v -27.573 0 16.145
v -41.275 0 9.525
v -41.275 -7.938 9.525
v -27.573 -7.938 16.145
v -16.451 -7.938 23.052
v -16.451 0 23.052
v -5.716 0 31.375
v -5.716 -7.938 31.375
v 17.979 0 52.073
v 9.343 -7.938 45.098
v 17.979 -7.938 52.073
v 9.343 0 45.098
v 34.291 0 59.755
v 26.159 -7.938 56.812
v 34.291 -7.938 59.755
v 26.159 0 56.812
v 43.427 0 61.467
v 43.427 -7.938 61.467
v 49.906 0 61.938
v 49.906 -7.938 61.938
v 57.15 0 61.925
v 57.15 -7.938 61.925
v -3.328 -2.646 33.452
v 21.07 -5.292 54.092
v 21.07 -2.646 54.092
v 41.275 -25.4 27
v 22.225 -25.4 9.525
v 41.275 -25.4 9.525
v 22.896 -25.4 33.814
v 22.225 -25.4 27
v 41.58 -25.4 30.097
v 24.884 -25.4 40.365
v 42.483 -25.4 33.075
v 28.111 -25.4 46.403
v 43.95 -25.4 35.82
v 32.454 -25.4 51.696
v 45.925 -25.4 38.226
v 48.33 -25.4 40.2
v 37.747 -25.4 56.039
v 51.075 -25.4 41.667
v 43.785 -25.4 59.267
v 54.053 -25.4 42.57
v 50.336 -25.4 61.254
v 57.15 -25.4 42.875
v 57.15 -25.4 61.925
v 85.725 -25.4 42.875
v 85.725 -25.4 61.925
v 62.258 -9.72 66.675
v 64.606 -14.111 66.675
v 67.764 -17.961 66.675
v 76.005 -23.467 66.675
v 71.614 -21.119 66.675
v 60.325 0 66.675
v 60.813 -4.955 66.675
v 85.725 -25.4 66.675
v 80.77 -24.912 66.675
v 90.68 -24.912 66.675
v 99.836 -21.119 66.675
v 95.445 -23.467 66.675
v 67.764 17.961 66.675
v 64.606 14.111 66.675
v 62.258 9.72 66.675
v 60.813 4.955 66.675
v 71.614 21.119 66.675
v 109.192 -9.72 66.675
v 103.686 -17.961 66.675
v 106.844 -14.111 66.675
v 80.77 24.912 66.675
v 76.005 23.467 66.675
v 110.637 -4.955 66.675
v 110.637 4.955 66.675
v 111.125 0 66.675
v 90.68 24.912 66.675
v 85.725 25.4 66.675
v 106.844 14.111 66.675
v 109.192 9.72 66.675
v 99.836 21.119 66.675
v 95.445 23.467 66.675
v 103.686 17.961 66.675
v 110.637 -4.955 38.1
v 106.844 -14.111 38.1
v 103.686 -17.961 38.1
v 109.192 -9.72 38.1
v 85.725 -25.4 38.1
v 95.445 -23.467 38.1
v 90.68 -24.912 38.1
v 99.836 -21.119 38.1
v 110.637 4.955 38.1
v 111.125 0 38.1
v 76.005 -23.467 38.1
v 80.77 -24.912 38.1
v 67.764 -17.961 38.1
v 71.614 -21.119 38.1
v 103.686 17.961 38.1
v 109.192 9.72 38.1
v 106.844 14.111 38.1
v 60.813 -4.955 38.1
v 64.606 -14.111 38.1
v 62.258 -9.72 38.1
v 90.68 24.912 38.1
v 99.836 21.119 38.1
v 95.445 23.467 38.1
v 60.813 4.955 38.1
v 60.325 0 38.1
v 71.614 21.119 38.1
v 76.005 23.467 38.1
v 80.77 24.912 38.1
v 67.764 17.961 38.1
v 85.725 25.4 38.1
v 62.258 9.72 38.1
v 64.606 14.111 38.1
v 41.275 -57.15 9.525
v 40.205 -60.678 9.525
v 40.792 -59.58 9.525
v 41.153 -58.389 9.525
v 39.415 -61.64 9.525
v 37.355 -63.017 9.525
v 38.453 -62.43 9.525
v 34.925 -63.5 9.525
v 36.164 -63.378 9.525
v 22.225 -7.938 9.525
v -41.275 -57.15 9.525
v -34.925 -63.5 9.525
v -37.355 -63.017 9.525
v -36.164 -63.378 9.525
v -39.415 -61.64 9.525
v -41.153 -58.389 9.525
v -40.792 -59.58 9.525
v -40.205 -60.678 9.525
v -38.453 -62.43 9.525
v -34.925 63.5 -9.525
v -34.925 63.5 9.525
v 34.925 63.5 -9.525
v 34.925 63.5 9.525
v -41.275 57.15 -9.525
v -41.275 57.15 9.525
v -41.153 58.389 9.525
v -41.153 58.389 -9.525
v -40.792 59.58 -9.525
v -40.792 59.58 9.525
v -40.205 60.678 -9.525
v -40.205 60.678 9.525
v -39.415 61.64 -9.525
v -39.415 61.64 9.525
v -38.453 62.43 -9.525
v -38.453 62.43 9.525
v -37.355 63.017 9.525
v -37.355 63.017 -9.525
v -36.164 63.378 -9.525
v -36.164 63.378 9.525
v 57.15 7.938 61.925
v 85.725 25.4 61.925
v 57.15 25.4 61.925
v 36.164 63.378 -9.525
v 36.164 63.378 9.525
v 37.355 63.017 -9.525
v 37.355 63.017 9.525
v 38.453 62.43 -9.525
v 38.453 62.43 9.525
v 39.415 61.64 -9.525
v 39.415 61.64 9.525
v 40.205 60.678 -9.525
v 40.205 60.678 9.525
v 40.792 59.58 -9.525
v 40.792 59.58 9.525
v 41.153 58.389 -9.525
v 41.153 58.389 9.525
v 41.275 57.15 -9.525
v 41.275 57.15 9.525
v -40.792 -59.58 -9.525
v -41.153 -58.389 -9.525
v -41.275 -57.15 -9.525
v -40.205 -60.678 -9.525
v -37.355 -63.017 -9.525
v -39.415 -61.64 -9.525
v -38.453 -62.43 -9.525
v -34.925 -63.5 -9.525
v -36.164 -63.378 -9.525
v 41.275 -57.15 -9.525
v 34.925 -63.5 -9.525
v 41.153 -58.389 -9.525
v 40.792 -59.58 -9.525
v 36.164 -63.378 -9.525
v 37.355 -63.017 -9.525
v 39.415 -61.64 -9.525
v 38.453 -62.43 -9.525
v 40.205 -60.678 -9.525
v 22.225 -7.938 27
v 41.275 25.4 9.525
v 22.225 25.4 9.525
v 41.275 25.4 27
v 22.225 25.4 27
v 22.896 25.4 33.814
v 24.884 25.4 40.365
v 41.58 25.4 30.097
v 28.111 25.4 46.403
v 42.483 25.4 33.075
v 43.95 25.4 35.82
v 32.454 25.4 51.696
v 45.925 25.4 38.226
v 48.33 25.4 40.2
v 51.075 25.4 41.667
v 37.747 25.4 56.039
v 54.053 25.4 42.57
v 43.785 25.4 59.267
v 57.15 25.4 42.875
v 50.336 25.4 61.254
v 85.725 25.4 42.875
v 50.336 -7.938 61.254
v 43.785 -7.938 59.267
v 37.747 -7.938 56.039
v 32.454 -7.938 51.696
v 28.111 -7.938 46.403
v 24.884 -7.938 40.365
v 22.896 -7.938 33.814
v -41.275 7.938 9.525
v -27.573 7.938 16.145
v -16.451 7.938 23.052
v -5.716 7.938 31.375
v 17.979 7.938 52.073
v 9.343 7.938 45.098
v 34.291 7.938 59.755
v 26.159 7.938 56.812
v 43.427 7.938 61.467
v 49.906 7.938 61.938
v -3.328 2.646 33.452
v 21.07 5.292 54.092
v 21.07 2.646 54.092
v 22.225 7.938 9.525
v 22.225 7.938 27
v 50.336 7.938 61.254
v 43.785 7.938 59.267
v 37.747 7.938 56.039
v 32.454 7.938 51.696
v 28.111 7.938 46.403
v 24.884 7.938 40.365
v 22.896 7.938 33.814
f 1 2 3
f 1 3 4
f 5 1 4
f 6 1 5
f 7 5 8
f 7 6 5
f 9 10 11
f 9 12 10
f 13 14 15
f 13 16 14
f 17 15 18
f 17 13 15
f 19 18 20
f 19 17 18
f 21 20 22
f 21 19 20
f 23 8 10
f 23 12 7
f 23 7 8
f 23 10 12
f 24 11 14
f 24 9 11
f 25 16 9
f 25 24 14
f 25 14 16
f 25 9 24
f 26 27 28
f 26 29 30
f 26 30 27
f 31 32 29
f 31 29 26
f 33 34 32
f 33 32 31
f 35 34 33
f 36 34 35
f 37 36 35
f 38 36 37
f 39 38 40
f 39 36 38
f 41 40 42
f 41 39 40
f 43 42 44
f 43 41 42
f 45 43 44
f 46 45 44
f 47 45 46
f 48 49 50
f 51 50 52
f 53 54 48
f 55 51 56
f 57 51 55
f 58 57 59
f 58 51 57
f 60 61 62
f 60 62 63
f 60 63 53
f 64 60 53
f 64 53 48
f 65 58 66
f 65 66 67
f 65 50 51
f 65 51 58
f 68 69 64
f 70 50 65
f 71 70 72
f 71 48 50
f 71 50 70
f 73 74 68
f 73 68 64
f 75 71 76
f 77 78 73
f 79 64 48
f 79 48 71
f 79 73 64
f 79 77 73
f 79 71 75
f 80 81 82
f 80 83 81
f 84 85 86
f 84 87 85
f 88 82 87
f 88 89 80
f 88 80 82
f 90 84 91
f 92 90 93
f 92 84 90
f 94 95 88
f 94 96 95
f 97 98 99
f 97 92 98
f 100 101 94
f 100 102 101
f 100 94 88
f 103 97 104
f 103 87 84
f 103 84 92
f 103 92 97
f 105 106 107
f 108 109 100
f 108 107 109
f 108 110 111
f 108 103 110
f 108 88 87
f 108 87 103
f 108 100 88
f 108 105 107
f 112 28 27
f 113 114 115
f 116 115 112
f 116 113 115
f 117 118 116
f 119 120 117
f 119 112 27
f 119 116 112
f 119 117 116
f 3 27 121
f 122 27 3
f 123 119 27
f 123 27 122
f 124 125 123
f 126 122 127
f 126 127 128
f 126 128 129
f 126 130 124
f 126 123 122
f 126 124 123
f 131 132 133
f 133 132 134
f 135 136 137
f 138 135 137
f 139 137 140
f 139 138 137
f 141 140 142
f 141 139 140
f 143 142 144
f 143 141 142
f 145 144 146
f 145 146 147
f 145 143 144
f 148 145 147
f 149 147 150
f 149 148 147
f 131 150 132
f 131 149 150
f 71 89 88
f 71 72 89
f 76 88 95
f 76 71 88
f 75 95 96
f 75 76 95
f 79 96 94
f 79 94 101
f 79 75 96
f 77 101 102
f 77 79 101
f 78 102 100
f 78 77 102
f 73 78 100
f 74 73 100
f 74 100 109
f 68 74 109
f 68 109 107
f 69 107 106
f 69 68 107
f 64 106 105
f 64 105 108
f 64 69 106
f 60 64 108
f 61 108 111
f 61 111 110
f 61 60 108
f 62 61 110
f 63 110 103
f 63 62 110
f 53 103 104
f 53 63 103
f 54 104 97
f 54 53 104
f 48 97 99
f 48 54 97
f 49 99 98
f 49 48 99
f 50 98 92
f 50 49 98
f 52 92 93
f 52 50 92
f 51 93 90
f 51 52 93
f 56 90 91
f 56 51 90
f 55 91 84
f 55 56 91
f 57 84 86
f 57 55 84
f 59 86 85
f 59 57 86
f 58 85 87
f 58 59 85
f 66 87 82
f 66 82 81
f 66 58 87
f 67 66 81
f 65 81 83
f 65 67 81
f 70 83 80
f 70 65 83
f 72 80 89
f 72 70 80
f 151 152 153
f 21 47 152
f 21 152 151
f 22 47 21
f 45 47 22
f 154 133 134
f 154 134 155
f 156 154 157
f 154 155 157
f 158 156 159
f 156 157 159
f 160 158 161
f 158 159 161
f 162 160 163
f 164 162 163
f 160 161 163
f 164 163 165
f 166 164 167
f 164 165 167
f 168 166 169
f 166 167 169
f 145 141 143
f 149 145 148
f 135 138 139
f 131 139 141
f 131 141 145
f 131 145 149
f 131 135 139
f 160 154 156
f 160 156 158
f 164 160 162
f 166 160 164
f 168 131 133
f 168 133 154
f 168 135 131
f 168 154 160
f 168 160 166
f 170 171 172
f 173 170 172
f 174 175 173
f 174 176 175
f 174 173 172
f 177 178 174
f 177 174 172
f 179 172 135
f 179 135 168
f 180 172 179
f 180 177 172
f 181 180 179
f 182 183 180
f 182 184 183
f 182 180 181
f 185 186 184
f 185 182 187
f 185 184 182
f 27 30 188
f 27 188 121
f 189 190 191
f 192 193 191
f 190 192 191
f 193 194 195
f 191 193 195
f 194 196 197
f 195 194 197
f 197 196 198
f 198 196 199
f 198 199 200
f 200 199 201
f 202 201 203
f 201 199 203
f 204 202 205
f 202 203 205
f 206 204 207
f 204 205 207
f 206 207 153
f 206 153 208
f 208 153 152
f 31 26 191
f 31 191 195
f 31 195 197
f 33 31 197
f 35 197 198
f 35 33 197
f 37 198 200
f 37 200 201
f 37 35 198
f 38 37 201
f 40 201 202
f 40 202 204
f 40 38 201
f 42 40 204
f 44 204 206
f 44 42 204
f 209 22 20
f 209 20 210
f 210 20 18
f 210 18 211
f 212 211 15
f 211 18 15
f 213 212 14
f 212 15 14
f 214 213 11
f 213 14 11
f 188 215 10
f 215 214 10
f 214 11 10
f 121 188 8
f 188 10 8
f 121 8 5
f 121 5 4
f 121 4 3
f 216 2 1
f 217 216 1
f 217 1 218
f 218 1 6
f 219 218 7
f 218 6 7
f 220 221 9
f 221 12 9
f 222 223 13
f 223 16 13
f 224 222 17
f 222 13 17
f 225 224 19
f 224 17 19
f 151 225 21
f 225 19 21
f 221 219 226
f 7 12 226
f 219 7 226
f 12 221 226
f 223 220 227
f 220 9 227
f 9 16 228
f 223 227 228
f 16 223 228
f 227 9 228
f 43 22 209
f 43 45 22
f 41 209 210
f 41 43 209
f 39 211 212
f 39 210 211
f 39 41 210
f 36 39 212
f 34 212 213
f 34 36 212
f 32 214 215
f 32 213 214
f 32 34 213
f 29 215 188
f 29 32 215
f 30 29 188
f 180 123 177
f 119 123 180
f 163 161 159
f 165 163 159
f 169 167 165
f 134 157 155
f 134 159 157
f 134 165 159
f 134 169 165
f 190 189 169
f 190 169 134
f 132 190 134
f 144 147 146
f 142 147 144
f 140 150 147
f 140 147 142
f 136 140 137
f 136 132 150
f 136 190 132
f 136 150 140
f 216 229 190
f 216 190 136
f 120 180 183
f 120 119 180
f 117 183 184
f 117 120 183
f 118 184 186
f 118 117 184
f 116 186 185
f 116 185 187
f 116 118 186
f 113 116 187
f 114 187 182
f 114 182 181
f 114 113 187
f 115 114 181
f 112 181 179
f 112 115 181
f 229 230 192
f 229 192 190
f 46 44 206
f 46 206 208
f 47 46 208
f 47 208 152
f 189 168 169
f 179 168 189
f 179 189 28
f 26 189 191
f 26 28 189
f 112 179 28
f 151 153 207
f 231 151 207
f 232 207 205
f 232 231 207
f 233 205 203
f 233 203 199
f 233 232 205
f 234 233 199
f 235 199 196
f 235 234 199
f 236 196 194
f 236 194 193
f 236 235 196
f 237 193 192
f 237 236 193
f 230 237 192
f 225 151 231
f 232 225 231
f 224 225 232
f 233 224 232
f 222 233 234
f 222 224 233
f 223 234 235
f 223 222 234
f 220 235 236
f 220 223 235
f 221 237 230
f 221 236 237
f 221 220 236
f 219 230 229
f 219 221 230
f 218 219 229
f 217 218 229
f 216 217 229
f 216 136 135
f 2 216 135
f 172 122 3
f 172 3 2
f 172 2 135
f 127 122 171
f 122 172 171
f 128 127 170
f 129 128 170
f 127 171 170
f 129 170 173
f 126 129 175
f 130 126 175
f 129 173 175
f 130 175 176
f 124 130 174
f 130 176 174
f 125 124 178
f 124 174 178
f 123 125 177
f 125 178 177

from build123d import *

# Parameters (mm, degrees)
F1_DEPTH = 63.5
F0_W     = 25.4
F0_H     = 19.05
F2_DEPTH = 25.4
F3_DEPTH = 7.9375
F5_R     = 6.35


with BuildPart() as f1:
    # F0 (on Front) → F1 (new body, symmetric)
    with BuildSketch(Plane.XZ):
        Polygon((-41.275, 9.525), (-41.275, -9.525), (41.275, -9.525), (41.275, 9.525), (22.225, 9.525), align=None)
    extrude(amount=F1_DEPTH, both=True)

    # F0 (on Front) → F2 (join, symmetric)
    with BuildSketch(Plane.XZ):
        with BuildLine():
            Line((22.225, 9.525), (41.275, 9.525))
            Line((41.275, 9.525), (41.275, 27.0002))
            ThreePointArc((41.275, 27.0002), (45.9246798487, 38.2255201513), (57.15, 42.8752))
            Line((57.15, 42.8752), (60.325, 42.8752))
            Line((60.325, 42.8752), (60.325, 61.9252))
            Line((60.325, 61.9252), (57.15, 61.9252))
            ThreePointArc((57.15, 61.9252), (32.4542956671, 51.6959043329), (22.225, 27.0002))
            Line((22.225, 27.0002), (22.225, 9.525))
        make_face()
        with Locations((73.025, 52.4002)):
            Rectangle(F0_W, F0_H)
    extrude(amount=F2_DEPTH, both=True)

    # F0 (on Front) → F3 (join, symmetric)
    with BuildSketch(Plane.XZ):
        with BuildLine():
            add(Edge.make_bspline(
                [(-41.275, 9.525), (11.8567310274, 31.9232158363), (6.8178027868, 63.6684522033), (57.15, 61.9252)],
                knots=[0, 0, 0, 0, 111.5045361635, 111.5045361635, 111.5045361635, 111.5045361635], degree=3))
            Line((-41.275, 9.525), (22.225, 9.525))
            Line((22.225, 9.525), (22.225, 27.0002))
            ThreePointArc((22.225, 27.0002), (32.4542956671, 51.6959043329), (57.15, 61.9252))
        make_face()
    extrude(amount=F3_DEPTH, both=True)

    # F5
    f5_edges = [f1.edges().sort_by_distance(p)[0] for p in [
        (41.275, -63.5, 0),
        (-41.275, -63.5, 0),
        (41.275, 63.5, 0),
        (-41.275, 63.5, 0),
    ]]
    fillet(f5_edges, radius=F5_R)


with BuildPart() as f4:
    # F0 (on Front) → F4 (revolve)
    with BuildSketch(Plane.XZ):
        Polygon((85.725, 66.675), (85.725, 61.9252), (85.725, 42.8752), (85.725, 38.1), (111.125, 38.1), (111.125, 66.675), align=None)
    revolve(axis=Axis((85.725, 0, 52.3875), (0, 0, 1)))


solid = Compound([f1.part, f4.part])
